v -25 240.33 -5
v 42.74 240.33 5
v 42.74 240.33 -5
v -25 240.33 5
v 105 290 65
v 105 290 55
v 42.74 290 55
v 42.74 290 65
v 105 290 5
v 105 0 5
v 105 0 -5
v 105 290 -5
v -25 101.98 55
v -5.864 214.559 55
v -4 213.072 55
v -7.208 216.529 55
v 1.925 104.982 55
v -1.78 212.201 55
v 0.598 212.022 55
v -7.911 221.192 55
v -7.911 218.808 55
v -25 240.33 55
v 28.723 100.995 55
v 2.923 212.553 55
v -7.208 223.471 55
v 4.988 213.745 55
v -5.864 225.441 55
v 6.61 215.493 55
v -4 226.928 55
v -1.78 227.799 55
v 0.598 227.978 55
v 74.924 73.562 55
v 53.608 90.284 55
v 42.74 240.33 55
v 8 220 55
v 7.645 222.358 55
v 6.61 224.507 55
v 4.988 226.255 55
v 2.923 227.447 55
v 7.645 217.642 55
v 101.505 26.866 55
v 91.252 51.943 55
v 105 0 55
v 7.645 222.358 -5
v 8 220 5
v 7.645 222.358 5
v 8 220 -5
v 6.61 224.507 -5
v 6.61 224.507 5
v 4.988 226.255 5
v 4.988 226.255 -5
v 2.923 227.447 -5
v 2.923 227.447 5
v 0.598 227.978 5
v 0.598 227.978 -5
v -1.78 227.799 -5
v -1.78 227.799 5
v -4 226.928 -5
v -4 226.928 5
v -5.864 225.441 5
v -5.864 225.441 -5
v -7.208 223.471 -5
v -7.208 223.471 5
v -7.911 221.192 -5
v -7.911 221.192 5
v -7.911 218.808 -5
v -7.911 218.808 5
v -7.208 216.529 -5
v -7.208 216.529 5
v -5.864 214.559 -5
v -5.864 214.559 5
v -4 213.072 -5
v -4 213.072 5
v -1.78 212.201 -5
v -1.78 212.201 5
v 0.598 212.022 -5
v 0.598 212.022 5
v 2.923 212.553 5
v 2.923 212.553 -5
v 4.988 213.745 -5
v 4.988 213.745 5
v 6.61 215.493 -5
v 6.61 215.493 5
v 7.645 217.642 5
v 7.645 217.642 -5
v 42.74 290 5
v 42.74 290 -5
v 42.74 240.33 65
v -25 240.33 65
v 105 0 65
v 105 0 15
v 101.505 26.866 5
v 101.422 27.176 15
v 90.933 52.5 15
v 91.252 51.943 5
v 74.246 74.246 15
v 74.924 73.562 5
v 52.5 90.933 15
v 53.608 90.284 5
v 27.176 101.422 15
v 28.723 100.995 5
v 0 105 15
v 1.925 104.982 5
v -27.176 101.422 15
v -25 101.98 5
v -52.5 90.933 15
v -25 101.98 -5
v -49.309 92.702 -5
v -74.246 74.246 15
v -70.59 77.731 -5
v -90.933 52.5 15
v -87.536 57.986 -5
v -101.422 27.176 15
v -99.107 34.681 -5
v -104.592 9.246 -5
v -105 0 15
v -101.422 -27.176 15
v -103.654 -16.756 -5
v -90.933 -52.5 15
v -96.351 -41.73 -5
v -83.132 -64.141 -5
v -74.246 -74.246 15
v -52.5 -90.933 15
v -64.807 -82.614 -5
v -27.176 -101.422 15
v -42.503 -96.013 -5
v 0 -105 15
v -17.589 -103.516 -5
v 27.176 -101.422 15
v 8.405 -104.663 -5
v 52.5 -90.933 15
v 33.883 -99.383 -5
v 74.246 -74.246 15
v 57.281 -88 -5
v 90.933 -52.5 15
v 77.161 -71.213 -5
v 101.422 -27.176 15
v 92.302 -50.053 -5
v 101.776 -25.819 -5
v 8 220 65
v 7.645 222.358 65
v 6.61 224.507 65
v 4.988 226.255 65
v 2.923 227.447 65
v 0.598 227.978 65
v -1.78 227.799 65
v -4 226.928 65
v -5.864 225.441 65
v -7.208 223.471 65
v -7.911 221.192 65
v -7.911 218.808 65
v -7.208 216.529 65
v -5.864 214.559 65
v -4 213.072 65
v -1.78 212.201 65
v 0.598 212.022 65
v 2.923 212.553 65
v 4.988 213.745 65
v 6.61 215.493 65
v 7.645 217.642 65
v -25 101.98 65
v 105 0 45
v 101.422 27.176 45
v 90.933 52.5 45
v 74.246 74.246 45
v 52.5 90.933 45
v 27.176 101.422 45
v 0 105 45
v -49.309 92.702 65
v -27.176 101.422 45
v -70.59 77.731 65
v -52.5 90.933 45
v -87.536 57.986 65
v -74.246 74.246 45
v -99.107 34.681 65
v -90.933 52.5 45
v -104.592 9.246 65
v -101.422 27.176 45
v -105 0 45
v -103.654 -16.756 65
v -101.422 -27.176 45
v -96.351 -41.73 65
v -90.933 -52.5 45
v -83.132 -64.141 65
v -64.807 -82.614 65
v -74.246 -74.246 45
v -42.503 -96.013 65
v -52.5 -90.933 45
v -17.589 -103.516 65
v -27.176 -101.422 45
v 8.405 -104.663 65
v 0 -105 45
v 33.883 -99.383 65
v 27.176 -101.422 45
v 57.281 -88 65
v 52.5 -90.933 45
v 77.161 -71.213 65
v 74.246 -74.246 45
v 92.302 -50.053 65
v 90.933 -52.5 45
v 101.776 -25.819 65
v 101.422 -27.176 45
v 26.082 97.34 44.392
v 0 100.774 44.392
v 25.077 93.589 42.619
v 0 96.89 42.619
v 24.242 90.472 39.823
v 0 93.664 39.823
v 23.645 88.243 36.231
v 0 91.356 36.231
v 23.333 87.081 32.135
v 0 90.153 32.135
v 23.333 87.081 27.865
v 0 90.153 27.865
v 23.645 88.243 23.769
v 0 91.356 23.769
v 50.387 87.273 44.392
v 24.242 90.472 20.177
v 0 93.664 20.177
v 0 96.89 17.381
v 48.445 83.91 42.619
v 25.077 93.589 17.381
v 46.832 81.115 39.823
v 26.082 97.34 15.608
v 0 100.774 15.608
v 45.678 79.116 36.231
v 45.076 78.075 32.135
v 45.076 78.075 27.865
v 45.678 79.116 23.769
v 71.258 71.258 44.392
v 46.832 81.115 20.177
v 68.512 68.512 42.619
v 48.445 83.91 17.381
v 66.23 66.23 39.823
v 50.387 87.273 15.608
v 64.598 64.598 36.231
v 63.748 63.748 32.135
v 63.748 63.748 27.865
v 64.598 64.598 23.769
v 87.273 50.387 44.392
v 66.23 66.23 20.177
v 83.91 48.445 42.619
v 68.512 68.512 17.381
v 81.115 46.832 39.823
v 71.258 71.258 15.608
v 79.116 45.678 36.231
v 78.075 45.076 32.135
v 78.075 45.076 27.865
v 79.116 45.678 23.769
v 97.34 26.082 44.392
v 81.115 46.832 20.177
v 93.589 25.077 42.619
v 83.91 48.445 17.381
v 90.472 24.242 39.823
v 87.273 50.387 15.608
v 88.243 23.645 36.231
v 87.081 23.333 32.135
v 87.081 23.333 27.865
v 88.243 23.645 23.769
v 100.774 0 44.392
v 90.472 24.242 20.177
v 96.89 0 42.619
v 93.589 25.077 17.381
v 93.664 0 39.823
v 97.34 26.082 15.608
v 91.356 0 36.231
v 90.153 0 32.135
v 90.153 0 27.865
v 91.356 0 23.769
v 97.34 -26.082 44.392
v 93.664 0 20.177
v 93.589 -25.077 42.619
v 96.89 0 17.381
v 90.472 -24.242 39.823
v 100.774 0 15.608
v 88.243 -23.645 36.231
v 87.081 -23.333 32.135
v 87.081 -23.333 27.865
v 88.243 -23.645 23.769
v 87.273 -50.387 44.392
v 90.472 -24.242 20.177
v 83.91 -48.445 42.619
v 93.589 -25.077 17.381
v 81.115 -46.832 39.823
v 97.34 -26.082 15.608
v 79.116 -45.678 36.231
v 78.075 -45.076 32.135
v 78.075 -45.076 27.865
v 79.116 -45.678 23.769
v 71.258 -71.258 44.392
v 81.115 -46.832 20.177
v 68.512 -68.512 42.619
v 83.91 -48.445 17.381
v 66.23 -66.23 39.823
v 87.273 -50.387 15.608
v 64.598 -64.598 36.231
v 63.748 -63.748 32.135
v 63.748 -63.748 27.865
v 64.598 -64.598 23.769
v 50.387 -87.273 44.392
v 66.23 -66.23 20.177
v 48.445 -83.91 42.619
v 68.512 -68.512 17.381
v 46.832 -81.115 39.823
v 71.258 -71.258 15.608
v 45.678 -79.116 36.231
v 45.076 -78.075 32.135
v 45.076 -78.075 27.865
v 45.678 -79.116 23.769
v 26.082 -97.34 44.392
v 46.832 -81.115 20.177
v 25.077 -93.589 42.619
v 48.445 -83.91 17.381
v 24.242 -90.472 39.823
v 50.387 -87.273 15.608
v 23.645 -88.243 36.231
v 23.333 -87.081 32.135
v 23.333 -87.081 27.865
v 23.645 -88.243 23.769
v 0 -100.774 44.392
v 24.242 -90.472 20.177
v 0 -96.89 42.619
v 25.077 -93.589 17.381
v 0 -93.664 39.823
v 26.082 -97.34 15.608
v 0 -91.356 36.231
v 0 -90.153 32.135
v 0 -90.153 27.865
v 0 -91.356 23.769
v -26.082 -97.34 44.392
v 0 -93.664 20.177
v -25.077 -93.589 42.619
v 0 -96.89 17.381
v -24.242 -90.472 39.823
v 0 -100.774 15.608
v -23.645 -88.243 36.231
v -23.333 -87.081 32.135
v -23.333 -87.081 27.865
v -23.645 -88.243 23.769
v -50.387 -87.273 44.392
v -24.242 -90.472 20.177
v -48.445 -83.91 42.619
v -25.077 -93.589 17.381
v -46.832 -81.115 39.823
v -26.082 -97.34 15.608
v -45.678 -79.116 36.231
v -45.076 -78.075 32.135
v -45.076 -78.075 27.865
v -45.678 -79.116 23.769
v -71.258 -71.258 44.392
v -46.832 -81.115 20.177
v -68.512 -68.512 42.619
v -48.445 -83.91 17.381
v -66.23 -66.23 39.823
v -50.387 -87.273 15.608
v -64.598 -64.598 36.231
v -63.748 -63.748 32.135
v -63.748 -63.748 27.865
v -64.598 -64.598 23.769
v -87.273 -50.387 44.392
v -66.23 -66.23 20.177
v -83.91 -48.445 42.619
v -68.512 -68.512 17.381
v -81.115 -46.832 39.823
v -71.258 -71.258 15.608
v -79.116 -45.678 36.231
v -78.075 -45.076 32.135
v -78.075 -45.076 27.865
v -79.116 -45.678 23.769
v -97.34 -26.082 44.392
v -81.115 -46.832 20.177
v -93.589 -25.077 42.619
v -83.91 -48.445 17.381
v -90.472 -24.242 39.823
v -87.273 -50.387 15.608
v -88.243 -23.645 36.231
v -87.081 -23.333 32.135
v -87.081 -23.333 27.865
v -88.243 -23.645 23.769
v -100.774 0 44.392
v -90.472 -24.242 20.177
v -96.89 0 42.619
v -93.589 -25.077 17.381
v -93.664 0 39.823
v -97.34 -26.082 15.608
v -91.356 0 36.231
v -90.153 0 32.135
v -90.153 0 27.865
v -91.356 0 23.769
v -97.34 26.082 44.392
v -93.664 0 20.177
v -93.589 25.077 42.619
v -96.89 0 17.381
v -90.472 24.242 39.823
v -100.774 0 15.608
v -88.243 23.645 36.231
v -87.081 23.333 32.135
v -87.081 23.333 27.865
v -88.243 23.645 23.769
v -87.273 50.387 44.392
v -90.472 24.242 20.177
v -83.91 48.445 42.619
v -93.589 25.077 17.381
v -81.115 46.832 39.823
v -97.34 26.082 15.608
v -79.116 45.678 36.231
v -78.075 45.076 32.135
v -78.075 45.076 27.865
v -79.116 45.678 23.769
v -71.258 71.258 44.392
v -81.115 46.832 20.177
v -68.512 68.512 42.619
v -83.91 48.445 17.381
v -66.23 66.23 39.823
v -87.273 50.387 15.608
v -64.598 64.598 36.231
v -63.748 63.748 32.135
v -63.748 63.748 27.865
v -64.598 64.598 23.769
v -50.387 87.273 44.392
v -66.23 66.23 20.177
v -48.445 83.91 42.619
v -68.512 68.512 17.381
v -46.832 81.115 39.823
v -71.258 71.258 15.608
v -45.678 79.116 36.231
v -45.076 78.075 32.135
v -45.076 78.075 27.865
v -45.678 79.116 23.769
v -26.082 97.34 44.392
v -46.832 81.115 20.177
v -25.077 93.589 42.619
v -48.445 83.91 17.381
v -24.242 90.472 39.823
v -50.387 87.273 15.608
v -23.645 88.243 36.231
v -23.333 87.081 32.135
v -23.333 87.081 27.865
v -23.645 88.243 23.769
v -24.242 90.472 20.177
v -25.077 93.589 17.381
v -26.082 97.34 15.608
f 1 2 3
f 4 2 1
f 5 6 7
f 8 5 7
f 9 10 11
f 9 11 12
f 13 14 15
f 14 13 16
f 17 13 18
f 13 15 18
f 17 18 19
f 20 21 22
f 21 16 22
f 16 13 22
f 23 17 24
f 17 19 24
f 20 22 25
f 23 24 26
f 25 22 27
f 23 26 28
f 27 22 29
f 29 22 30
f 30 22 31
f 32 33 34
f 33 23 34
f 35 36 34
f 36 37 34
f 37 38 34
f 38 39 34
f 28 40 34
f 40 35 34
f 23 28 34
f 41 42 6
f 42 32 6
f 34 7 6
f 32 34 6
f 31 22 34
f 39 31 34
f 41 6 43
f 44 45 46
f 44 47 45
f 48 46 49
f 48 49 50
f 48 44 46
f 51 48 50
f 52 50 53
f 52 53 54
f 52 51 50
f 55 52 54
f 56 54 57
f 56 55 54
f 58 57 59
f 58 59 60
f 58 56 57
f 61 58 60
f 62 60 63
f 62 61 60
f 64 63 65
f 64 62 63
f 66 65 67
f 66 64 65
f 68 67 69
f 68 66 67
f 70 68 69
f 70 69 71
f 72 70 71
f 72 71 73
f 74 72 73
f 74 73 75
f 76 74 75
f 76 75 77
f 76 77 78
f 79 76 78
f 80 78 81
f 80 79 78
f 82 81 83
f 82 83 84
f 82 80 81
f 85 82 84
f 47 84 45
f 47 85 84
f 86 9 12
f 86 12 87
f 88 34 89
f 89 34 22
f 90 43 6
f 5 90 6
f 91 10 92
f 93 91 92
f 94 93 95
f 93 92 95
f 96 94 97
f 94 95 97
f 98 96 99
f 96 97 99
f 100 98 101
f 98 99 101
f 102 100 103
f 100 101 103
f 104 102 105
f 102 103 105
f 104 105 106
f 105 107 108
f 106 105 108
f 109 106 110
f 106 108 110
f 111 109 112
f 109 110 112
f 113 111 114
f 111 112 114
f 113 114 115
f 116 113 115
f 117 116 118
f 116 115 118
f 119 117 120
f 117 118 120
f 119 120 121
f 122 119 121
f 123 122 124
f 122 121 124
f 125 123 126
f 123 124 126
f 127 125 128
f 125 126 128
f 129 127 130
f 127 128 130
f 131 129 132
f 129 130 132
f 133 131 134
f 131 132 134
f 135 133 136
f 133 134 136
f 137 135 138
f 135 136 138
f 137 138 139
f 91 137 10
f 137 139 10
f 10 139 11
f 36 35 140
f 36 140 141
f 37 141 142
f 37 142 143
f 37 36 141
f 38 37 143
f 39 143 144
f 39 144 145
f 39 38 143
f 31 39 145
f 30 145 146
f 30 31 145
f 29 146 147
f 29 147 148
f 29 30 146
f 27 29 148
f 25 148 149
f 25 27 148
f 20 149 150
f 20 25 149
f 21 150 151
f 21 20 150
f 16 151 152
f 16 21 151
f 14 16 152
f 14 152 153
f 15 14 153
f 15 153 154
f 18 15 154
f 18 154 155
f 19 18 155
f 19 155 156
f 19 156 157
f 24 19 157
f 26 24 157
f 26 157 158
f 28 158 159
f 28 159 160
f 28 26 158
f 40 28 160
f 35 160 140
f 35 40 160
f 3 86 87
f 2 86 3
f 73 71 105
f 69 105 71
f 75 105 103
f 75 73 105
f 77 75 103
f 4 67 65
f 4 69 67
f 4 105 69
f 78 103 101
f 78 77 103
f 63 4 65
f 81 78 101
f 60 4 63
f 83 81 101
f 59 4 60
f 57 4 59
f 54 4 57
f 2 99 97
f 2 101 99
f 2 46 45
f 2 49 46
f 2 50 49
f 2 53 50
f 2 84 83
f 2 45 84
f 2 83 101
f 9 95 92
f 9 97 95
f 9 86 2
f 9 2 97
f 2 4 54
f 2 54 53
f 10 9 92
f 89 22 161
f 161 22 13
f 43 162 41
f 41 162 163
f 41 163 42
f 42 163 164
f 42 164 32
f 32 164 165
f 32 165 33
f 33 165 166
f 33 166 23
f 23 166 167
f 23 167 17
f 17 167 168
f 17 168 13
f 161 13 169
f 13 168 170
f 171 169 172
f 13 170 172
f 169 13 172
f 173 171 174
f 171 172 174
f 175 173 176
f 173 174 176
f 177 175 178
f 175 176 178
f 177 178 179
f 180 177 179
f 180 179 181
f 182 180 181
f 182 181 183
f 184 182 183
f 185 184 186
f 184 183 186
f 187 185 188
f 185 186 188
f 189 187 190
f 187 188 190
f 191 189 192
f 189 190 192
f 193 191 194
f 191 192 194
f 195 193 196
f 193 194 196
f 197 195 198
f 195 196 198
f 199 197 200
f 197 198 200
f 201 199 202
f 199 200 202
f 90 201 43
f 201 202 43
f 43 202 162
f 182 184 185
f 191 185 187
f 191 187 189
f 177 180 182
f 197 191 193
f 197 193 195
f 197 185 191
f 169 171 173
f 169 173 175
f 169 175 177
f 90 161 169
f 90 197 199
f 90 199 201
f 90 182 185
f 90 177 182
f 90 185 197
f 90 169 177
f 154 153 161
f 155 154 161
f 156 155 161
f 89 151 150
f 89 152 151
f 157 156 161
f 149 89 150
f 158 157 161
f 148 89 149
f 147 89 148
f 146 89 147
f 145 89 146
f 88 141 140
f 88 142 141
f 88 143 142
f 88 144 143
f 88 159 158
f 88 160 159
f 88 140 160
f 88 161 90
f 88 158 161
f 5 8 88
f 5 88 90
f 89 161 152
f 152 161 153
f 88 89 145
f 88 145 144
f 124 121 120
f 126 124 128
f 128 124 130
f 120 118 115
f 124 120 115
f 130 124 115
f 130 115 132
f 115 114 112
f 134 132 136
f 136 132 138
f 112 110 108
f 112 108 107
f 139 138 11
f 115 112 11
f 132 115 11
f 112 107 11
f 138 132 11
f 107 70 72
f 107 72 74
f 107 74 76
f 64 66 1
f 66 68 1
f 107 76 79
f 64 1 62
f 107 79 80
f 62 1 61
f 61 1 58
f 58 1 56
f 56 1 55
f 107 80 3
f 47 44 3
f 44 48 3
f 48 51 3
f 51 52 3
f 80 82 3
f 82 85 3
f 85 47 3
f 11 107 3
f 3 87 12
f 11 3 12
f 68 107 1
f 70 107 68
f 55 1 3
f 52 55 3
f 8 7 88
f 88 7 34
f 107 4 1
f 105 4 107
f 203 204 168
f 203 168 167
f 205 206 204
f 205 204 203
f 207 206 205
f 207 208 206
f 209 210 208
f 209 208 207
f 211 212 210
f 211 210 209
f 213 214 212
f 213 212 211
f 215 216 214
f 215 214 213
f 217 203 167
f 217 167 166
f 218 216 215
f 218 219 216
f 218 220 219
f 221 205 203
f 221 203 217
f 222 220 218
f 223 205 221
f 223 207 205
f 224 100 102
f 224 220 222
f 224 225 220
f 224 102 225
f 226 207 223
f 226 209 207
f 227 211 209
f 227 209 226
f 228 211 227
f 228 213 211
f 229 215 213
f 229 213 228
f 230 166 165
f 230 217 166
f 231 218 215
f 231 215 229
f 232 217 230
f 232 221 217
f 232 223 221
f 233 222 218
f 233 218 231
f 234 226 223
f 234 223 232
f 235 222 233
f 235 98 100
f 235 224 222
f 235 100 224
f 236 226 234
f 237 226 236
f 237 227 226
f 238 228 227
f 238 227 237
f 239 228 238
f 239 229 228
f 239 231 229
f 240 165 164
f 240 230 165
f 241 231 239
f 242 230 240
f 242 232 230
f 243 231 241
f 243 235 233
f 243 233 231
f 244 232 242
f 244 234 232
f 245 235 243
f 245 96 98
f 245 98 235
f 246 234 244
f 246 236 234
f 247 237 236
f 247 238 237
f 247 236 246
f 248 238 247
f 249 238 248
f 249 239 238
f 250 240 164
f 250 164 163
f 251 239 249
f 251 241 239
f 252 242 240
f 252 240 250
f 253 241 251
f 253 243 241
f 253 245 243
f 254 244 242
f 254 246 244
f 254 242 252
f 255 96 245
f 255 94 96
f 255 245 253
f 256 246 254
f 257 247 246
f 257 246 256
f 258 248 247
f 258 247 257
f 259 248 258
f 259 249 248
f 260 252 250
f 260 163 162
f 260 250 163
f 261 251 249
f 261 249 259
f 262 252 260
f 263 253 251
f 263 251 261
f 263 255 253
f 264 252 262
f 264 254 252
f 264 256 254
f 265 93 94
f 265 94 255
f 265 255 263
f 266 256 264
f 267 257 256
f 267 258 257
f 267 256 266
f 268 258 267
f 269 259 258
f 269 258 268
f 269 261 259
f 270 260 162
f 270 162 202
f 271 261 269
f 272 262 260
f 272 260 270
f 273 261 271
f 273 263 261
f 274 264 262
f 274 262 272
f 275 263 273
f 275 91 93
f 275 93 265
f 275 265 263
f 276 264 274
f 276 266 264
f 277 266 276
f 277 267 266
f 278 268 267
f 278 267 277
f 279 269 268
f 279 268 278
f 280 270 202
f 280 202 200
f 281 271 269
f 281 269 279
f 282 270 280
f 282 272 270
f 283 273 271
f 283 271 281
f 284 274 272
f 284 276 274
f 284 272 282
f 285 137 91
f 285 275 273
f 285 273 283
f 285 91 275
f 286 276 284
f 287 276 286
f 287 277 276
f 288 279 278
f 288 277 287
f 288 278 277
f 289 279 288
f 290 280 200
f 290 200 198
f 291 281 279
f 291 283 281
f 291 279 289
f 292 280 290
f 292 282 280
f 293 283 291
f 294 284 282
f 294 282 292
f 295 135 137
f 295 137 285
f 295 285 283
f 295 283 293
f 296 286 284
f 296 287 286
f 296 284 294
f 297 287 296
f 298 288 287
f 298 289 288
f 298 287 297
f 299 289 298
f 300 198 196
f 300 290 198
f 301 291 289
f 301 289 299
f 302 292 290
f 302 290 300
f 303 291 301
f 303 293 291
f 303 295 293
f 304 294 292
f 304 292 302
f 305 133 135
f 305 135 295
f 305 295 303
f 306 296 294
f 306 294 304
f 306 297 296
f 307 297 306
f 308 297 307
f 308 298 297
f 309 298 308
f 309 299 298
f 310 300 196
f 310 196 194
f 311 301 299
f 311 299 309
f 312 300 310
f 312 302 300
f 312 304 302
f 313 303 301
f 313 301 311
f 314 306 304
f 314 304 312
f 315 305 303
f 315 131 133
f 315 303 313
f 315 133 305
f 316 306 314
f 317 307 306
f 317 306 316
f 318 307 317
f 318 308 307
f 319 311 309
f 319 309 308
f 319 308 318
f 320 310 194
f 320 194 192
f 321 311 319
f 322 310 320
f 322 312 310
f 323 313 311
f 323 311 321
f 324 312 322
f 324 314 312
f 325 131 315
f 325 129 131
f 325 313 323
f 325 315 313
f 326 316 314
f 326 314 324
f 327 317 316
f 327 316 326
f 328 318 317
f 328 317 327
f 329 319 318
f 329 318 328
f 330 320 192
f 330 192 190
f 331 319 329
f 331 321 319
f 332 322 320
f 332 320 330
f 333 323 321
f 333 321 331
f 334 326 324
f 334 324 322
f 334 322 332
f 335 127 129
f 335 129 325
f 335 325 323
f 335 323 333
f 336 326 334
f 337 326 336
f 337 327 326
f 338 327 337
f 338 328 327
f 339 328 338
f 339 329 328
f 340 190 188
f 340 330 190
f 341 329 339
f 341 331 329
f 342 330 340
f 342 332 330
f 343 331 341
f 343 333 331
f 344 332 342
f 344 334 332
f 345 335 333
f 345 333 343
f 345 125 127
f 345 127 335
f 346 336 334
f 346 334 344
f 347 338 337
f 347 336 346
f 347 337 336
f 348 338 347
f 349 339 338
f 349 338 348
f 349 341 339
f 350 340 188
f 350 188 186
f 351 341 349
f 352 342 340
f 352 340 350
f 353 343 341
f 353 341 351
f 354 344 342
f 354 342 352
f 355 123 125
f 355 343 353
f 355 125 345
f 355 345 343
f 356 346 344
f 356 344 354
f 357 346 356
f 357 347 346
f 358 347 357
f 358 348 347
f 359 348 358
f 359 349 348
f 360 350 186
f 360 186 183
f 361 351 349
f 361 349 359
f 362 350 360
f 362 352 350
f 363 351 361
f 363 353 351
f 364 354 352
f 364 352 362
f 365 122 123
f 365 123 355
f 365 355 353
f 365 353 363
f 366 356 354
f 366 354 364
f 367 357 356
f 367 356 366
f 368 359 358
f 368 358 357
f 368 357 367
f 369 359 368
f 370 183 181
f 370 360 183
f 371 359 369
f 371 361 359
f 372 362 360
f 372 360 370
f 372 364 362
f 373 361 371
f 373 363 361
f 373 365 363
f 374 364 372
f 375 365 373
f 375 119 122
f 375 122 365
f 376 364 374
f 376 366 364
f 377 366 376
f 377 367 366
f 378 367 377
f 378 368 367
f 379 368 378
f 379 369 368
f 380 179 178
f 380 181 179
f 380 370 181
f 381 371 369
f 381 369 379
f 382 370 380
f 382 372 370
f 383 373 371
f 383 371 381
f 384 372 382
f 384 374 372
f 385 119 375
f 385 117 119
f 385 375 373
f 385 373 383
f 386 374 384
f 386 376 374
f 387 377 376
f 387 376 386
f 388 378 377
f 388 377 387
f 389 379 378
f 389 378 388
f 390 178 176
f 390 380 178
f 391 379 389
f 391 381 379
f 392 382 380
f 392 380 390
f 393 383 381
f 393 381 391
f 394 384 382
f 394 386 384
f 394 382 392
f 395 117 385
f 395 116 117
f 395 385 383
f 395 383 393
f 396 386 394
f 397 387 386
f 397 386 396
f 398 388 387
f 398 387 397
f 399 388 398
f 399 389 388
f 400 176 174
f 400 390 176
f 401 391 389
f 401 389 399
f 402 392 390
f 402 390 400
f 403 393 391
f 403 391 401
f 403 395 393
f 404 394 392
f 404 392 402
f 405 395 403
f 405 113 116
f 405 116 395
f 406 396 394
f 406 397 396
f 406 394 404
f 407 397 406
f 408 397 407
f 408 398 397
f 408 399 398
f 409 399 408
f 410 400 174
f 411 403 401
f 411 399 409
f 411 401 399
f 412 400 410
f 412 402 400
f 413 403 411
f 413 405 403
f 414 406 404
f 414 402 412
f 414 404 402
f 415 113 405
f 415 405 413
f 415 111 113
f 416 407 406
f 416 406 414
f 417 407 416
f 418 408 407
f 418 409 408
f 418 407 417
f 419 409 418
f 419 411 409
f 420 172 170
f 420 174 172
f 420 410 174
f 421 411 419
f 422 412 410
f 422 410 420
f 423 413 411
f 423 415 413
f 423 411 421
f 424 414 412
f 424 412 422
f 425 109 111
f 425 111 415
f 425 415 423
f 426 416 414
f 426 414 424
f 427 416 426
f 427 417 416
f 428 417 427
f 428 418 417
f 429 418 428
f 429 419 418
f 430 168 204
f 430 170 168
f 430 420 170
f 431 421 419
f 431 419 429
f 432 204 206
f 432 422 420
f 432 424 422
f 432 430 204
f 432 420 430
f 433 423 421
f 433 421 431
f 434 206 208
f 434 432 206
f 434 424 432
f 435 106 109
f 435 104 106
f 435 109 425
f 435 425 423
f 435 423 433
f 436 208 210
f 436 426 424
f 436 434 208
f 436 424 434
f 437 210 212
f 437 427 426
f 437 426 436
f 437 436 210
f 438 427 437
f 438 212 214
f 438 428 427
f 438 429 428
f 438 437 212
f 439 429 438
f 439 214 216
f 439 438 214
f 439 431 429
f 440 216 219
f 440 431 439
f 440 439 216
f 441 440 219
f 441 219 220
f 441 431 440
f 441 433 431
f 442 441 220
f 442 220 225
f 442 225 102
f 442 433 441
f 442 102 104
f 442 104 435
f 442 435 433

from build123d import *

# Parameters (mm, degrees)
SKETCH1_R           = 8
BOSS_EXTRUDE1_DEPTH = 5
BOSS_EXTRUDE2_START = 5
SKETCH1_3_R         = 105
BOSS_EXTRUDE2_DEPTH = 50
BOSS_EXTRUDE3_START = 55
SKETCH1_4_R         = 8
SKETCH1_4_R_2       = 105
BOSS_EXTRUDE3_DEPTH = 10
SKETCH2_R           = 15


with BuildPart() as part:
    # Sketch1 → Boss-Extrude1 (new body, symmetric)
    with BuildSketch(Plane.XY):
        with BuildLine():
            Line((-25, 240.330386365), (-25, 101.980390272))
            ThreePointArc((-25, 101.980390272), (-64.807406984, -82.613558209), (105, 0))
            Line((105, 0), (105, 290))
            Line((105, 290), (42.740477075, 290))
            Line((42.740477075, 290), (42.740477075, 240.330386365))
            Line((42.740477075, 240.330386365), (-25, 240.330386365))
        make_face()
        with Locations((0, 220)):
            Circle(SKETCH1_R, mode=Mode.SUBTRACT)
    extrude(amount=BOSS_EXTRUDE1_DEPTH, both=True)

    # Sketch1<3> → Boss-Extrude2 (add)
    with BuildSketch(Plane.XY.offset(BOSS_EXTRUDE2_START)):
        Circle(SKETCH1_3_R)
    extrude(amount=BOSS_EXTRUDE2_DEPTH)

    # Sketch1<4> → Boss-Extrude3 (add)
    with BuildSketch(Plane.XY.offset(BOSS_EXTRUDE3_START)):
        with BuildLine():
            ThreePointArc((-25, 101.980390272), (64.807406984, 82.613558209), (105, 0))
            Line((105, 0), (105, 290))
            Line((105, 290), (42.740477075, 290))
            Line((42.740477075, 290), (42.740477075, 240.330386365))
            Line((42.740477075, 240.330386365), (-25, 240.330386365))
            Line((-25, 240.330386365), (-25, 101.980390272))
        make_face()
        with Locations((0, 220)):
            Circle(SKETCH1_4_R, mode=Mode.SUBTRACT)
        Circle(SKETCH1_4_R_2)
    extrude(amount=BOSS_EXTRUDE3_DEPTH)


with BuildPart() as body_2:
    # Sketch2 → Revolve1 (revolve)
    with BuildSketch(Plane(origin=(0, 0, 0), x_dir=(0, 0, -1), z_dir=(1, 0, 0))):
        with Locations((-30, 105)):
            Circle(SKETCH2_R)
    revolve(axis=Axis((0, 0, 45), (0, 0, -1)))


with BuildPart() as part_1:
    add(part.part)

    # Combine1: cut body 2
    add(body_2.part, mode=Mode.SUBTRACT)


solid = part_1.part
